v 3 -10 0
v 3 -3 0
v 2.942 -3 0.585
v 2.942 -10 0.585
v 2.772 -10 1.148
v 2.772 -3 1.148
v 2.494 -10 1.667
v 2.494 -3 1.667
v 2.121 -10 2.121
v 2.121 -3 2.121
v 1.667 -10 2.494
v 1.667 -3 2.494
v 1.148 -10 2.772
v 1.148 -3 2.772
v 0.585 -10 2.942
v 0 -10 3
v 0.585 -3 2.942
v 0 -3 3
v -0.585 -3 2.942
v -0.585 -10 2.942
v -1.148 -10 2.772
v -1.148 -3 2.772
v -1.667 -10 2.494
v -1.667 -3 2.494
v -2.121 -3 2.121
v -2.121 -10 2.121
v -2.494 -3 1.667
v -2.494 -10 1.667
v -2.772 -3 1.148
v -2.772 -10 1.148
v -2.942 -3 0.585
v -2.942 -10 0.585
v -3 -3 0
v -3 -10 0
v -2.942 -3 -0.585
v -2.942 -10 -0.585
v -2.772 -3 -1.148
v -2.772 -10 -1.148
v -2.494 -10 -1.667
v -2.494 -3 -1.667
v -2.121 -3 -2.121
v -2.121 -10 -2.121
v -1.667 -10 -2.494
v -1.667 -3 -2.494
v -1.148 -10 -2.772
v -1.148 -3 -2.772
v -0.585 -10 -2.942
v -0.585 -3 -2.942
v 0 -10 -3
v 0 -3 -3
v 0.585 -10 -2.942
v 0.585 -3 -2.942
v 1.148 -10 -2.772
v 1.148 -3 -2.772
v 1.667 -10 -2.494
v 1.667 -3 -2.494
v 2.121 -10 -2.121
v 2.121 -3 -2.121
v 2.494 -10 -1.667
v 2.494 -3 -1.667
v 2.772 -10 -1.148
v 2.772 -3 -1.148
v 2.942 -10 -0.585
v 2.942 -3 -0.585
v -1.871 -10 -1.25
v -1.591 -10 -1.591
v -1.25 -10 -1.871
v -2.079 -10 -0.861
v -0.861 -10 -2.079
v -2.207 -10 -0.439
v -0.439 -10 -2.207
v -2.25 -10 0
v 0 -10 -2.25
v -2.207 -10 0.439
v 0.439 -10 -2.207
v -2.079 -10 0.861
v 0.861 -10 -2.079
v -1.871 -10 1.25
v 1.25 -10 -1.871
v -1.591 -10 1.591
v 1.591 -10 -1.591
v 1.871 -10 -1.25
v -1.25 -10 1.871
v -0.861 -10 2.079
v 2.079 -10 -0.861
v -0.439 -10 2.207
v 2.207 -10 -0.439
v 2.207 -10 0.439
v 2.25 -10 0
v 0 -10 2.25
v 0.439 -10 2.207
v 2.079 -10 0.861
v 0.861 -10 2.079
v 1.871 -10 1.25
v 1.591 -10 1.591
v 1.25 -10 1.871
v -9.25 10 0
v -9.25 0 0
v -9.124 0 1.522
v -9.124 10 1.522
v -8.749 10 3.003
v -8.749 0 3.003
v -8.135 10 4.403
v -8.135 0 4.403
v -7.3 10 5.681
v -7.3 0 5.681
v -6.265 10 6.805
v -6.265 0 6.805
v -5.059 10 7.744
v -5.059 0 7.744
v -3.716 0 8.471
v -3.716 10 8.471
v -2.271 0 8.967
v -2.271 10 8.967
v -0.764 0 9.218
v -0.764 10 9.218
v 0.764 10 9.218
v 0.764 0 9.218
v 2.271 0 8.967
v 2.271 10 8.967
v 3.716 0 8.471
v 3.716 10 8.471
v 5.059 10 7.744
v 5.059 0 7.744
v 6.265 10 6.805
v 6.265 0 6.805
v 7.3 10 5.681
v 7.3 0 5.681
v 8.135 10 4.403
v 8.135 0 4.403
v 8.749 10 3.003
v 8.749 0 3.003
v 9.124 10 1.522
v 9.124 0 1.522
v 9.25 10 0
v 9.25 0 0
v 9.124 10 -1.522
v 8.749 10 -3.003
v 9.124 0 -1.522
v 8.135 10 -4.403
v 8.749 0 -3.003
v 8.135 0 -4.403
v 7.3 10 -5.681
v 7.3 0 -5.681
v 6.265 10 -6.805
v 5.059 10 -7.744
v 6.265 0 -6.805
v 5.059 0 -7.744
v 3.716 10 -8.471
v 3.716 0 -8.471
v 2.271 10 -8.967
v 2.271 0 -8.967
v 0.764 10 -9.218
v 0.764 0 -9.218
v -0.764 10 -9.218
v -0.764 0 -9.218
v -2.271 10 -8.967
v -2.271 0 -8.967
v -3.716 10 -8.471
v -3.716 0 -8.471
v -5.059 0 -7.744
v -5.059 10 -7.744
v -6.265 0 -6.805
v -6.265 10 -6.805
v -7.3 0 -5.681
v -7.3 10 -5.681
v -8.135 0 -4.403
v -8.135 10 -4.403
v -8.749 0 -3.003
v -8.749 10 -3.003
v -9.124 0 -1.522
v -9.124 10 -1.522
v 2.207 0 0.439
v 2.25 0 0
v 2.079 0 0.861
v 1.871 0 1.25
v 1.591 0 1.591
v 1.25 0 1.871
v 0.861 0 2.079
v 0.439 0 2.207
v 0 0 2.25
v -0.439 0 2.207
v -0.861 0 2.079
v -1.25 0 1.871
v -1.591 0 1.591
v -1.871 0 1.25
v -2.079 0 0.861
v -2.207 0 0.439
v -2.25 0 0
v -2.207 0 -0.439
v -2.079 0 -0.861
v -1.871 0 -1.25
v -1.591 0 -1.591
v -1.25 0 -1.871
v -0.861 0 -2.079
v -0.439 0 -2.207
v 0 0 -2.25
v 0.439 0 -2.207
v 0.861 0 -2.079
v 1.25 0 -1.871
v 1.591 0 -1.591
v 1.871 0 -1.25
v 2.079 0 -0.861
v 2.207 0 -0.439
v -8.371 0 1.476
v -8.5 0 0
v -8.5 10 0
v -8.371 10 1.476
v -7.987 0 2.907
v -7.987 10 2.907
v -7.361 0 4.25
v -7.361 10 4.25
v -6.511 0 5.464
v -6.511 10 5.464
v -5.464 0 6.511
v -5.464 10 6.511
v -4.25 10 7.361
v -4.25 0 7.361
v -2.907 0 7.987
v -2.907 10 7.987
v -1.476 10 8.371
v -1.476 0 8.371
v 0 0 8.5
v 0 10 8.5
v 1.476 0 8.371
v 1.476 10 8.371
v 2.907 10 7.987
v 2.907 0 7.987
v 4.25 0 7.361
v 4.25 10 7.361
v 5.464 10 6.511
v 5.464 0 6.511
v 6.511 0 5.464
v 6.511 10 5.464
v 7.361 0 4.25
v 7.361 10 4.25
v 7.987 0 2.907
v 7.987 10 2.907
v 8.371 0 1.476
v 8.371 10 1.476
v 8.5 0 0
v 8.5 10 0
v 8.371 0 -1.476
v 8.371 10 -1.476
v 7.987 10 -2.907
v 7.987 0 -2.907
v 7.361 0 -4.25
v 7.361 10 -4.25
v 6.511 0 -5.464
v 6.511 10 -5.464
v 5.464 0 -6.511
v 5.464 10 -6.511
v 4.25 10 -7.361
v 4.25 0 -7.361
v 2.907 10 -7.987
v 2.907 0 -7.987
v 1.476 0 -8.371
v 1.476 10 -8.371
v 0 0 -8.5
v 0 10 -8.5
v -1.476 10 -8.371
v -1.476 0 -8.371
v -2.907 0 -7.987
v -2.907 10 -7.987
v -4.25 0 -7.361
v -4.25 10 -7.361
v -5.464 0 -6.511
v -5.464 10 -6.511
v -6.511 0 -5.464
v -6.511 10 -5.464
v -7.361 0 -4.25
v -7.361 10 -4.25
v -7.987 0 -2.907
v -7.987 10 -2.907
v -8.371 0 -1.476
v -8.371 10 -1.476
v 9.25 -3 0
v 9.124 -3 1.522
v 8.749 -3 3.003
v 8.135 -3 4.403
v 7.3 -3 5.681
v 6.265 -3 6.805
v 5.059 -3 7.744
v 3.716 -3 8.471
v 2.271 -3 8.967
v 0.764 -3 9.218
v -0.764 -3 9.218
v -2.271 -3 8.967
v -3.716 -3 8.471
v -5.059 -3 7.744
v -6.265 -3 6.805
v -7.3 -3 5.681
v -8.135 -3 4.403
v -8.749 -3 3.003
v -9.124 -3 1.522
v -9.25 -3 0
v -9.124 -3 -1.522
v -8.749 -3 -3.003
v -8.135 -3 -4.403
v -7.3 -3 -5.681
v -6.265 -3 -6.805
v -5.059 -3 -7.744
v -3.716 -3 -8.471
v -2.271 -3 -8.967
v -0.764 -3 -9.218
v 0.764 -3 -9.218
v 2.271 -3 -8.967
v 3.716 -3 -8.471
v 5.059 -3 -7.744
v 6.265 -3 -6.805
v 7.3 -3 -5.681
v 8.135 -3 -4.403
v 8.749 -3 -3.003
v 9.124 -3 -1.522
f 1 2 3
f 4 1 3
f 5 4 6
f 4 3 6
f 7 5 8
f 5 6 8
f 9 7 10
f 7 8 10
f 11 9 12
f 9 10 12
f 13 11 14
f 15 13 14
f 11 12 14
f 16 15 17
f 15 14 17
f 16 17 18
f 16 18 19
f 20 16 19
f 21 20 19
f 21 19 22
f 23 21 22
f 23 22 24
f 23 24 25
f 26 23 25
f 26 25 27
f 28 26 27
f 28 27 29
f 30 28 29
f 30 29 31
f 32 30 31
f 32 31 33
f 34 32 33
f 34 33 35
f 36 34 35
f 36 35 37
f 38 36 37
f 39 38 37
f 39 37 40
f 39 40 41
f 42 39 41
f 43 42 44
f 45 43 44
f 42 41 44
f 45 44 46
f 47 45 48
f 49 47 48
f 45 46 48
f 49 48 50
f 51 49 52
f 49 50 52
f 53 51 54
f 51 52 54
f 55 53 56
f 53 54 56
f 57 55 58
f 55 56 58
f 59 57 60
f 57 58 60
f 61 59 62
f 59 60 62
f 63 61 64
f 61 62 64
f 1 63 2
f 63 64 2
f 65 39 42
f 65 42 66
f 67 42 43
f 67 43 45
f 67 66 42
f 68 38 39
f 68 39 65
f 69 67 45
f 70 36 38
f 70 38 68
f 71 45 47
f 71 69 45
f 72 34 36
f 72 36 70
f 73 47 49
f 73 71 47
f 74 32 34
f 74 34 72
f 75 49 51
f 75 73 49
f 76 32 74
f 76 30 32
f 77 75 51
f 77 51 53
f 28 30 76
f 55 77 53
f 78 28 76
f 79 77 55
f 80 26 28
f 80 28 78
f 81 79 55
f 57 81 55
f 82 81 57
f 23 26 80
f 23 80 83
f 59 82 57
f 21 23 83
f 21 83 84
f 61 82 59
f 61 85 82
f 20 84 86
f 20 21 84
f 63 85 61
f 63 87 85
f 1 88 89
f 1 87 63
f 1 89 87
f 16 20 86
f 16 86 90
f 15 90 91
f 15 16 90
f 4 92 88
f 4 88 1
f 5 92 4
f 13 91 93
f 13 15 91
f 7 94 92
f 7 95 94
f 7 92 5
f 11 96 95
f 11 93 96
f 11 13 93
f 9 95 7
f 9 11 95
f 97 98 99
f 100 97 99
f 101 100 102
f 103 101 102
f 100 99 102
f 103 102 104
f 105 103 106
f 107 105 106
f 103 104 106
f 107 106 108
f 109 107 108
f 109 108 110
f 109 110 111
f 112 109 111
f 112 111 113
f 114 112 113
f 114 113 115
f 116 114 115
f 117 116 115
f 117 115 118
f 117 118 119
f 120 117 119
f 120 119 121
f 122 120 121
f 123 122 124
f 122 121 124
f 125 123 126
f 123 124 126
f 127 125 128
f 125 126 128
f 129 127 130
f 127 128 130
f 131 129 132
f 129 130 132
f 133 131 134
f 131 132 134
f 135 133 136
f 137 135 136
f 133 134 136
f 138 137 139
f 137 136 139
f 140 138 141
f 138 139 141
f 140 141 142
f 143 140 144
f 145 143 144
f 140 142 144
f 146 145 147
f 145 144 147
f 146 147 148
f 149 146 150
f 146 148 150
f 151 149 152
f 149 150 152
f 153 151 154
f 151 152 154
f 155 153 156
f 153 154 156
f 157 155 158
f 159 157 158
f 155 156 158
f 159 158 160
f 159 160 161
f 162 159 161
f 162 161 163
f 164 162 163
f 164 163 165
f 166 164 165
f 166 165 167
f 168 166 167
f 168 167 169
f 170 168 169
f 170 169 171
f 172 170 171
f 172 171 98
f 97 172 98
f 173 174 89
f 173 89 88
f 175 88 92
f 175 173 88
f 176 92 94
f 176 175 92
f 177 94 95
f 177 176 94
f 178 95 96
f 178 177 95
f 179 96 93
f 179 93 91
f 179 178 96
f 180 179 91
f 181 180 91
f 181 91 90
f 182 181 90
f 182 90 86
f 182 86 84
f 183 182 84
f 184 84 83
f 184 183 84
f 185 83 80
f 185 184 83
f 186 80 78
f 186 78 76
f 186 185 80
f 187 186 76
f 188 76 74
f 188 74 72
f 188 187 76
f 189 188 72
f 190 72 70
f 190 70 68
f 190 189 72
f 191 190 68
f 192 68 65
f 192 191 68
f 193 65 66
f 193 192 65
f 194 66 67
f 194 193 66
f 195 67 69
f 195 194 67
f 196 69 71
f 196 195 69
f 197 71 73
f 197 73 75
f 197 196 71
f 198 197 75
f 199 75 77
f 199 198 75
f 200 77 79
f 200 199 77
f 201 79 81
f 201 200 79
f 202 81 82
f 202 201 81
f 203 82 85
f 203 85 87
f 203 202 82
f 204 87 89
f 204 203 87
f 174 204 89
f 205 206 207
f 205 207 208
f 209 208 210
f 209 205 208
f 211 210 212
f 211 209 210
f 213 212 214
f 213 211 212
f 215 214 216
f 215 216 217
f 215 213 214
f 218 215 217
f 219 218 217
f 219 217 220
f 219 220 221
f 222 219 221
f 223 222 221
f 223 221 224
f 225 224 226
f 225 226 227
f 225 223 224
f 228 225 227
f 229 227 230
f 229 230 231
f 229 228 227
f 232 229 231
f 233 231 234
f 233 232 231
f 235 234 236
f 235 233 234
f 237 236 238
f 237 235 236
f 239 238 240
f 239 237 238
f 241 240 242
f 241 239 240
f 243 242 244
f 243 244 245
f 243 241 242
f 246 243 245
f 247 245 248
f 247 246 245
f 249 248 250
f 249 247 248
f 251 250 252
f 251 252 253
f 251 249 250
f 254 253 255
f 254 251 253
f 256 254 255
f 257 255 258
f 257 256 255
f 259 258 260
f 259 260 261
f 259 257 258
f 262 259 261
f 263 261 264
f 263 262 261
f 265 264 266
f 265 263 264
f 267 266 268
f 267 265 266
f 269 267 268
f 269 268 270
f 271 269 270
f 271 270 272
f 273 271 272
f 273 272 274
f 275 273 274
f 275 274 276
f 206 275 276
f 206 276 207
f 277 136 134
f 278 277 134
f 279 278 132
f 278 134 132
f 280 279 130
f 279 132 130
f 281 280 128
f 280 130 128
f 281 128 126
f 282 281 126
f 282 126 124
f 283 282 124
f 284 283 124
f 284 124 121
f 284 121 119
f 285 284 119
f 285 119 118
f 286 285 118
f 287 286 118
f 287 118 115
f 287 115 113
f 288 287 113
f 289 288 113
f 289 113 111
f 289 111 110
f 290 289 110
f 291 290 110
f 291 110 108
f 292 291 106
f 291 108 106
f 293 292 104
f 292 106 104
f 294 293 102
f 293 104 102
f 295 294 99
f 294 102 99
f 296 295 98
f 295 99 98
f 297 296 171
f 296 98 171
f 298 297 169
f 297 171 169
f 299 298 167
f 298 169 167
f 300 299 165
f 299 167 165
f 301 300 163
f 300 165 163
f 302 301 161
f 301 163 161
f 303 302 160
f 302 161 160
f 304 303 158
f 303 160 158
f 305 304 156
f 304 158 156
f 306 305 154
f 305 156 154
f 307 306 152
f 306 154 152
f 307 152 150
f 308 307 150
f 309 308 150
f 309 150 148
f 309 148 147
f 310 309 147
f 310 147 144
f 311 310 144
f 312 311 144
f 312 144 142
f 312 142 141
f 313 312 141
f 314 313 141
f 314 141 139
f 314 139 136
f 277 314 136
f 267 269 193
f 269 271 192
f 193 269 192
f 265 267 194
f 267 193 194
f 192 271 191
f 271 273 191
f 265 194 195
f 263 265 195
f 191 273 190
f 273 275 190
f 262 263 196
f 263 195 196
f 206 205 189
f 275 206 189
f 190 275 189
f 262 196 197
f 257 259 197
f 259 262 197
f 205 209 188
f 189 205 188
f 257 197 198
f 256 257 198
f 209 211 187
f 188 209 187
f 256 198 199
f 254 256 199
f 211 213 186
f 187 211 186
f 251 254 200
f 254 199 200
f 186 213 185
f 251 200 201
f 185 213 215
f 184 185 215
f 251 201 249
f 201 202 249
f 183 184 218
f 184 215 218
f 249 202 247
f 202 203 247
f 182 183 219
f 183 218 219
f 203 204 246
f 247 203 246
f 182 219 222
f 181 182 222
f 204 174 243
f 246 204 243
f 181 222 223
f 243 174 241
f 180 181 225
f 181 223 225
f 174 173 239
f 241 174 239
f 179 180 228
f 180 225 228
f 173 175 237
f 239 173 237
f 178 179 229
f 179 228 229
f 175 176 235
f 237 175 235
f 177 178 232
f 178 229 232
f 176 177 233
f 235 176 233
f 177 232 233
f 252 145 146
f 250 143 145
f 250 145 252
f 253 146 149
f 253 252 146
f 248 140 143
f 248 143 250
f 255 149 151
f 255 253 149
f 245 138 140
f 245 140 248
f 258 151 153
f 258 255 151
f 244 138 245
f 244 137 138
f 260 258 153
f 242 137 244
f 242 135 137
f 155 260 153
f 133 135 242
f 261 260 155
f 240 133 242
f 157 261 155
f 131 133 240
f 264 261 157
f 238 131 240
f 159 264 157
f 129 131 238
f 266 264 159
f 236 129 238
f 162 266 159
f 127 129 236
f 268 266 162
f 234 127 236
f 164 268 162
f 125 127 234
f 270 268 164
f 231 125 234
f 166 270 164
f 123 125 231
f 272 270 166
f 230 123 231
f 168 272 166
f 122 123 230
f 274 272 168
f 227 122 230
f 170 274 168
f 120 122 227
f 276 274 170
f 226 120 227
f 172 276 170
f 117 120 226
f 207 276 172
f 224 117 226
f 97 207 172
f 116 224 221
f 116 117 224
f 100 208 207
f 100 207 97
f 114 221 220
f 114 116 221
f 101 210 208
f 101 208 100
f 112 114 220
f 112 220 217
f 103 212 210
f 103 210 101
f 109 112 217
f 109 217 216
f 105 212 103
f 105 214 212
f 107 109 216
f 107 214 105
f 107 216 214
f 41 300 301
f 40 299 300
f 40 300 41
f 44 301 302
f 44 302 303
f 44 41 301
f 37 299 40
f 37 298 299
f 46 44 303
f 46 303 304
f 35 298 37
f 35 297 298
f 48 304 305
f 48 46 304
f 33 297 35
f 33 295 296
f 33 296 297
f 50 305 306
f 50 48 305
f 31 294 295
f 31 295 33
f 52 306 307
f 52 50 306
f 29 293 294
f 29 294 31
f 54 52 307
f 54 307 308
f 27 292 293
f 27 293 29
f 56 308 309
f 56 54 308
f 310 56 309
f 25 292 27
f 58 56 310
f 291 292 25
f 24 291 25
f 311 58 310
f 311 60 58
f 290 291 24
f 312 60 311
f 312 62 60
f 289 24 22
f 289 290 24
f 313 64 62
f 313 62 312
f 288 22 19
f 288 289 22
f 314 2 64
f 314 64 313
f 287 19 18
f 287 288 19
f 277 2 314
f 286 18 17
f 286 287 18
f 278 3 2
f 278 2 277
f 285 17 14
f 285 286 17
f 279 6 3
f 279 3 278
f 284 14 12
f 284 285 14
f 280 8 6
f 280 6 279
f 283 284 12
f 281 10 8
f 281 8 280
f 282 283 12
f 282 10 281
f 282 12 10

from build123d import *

# Parameters (mm, degrees)
F0_R     = 3
F0_R_2   = 2.25
F1_DEPTH = 10
F2_R     = 9.25
F2_R_2   = 3
F3_DEPTH = 3
F4_R     = 9.25
F4_R_2   = 8.5
F5_DEPTH = 10


with BuildPart() as f1:
    # F0 (on Front) → F1 (new body)
    with BuildSketch(Plane.XZ):
        Circle(F0_R)
        Circle(F0_R_2, mode=Mode.SUBTRACT)
    extrude(amount=F1_DEPTH)

    # F2 (on Front) → F3 (join)
    with BuildSketch(Plane.XZ):
        Circle(F2_R)
        Circle(F2_R_2, mode=Mode.SUBTRACT)
    extrude(amount=F3_DEPTH)

    # F4 (on face) → F5 (join)
    with BuildSketch(Plane(origin=(0, 0, 0), x_dir=(-1, 0, 0), z_dir=(0, 1, 0))):
        Circle(F4_R)
        Circle(F4_R_2, mode=Mode.SUBTRACT)
    extrude(amount=F5_DEPTH)


solid = f1.part
